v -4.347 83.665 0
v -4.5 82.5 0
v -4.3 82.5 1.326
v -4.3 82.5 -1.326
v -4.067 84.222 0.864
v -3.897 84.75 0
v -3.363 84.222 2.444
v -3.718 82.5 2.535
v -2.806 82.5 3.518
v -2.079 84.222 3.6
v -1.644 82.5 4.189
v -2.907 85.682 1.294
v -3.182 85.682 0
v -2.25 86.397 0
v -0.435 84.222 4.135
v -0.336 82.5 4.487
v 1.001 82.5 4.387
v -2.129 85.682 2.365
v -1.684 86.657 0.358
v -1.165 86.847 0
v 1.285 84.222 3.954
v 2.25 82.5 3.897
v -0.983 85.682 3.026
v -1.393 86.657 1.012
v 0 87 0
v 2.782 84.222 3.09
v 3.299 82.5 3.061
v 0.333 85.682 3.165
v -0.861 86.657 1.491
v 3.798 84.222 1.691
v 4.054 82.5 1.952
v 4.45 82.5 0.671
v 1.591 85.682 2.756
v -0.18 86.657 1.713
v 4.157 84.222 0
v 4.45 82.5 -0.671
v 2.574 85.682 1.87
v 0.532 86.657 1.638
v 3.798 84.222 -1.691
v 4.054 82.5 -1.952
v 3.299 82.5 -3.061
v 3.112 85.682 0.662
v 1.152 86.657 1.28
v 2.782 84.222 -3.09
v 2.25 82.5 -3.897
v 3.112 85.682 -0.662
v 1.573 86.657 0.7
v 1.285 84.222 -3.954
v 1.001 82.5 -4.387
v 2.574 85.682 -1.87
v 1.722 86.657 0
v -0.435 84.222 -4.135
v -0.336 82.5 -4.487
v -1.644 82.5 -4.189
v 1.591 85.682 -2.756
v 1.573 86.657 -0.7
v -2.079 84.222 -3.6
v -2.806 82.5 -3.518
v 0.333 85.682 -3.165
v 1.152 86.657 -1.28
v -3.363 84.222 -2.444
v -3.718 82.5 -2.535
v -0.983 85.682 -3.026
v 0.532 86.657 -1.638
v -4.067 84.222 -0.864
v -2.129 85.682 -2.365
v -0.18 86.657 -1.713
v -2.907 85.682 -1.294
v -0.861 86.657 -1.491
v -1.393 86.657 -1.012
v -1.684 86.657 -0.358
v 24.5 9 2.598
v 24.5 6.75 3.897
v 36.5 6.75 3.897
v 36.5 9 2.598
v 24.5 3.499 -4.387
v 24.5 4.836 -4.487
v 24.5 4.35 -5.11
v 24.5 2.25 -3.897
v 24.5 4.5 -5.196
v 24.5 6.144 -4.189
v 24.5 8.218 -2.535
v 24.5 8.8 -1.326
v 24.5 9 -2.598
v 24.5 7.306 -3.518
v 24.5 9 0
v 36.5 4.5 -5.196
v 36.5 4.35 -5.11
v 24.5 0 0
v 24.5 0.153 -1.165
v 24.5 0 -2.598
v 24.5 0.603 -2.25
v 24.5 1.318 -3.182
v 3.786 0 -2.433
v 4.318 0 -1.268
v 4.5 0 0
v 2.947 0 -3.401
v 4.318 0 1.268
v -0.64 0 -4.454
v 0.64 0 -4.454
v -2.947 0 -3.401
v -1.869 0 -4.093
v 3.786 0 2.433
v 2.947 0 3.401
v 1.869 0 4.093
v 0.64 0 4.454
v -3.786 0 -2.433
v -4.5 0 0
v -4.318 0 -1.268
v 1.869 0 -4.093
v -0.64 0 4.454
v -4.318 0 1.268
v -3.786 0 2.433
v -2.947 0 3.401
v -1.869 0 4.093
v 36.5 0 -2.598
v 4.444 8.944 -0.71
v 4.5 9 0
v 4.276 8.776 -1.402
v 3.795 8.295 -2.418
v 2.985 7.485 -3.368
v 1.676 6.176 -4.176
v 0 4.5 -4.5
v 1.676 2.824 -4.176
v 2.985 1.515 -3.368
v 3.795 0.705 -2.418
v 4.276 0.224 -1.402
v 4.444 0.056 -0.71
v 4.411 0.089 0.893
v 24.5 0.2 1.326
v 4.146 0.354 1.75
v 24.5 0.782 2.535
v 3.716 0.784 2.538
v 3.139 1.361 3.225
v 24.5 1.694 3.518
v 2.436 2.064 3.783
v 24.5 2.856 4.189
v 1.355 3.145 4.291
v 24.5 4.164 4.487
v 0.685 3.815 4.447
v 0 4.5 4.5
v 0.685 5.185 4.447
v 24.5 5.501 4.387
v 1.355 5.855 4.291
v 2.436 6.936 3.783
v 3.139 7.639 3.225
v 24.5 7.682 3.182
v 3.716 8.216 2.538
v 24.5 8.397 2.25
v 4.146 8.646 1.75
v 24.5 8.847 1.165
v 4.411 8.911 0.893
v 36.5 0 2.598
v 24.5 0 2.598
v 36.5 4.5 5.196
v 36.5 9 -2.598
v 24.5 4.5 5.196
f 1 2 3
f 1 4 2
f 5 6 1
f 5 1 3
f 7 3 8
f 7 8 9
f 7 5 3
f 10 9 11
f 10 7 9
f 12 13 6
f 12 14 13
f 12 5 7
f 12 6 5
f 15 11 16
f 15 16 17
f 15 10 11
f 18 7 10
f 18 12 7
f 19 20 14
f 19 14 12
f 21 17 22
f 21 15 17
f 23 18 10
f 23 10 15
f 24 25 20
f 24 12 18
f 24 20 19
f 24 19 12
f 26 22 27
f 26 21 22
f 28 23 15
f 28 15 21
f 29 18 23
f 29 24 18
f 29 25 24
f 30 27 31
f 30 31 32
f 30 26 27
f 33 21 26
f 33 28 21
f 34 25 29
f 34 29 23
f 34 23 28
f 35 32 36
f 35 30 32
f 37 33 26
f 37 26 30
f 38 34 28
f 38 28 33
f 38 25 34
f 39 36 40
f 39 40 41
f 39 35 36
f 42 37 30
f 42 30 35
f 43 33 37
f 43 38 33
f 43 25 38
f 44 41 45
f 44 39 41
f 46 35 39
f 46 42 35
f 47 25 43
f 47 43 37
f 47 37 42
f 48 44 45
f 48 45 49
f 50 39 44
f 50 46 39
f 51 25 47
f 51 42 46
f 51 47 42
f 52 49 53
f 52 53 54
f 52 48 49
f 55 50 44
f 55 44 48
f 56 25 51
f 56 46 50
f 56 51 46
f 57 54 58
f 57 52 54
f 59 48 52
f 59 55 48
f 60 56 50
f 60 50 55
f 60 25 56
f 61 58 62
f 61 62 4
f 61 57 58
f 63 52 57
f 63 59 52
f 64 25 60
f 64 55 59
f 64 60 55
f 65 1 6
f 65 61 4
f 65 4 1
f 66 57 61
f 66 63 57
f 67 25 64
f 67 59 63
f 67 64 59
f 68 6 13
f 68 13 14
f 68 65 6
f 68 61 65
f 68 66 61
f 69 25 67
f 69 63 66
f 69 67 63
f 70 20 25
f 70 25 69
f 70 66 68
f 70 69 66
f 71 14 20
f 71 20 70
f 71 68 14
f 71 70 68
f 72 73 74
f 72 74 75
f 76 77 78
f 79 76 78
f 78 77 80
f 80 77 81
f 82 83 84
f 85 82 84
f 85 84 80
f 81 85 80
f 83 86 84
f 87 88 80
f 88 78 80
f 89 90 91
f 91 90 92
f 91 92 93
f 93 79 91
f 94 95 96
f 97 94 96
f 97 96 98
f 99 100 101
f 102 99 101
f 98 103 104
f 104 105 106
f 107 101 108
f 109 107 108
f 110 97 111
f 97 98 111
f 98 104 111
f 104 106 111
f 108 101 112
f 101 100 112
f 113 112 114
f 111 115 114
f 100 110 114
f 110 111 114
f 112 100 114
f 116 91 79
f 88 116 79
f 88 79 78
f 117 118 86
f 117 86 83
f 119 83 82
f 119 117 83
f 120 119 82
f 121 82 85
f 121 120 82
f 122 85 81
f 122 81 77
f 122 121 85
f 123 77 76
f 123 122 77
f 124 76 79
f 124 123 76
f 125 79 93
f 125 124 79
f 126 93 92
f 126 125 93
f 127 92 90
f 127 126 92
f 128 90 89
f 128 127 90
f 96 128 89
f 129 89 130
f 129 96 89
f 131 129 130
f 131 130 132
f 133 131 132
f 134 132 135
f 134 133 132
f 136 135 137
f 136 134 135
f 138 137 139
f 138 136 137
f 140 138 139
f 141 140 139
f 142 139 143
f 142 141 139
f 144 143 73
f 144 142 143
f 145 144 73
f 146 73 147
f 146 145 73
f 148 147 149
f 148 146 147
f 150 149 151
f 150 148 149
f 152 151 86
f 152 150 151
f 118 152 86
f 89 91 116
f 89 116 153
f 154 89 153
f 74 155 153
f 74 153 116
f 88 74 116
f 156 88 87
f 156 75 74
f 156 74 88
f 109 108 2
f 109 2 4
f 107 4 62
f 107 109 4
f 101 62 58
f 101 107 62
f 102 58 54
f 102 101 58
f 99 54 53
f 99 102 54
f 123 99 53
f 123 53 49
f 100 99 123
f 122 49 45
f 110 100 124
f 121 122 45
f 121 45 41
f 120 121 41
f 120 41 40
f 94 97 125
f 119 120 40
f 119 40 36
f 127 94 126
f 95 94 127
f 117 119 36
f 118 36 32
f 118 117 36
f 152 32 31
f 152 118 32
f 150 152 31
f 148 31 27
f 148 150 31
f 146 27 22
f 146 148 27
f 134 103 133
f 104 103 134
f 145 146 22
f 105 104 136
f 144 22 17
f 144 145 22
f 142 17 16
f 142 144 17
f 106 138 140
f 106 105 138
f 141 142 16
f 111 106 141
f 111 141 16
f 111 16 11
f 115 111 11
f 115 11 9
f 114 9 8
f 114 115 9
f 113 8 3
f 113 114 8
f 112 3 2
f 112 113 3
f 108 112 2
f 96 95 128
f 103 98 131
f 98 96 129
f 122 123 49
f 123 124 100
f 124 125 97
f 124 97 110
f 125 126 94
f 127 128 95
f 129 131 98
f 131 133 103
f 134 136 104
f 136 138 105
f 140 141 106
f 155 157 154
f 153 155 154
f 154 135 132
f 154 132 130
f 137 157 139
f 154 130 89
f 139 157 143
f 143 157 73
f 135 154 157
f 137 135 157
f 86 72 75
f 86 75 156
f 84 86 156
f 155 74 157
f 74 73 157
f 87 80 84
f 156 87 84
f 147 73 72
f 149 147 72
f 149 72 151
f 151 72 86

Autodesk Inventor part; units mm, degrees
ref_plane "YZ Plane" through (0, 0, 0) normal (1, 0, 0) x (0, 1, 0)
ref_plane "XZ Plane" through (0, 0, 0) normal (0, 1, 0) x (-1, 0, 0)
ref_plane "XY Plane" through (0, 0, 0) normal (0, 0, 1) x (1, 0, 0)
sketch "Boceto1" plane through (0, 0, 0) normal (0, 1, 0) x (-1, 0, 0)
  circle A0 centre (0, 0) radius 4.5
  dimension "d0" = 9
extrude "Extrusión1" add sketch "Boceto1" along normal blind 87
fillet "Empalme1" radius 4.5 1 edges at (4.5, 87, 0)
sketch "Boceto2" plane through (0, 0, 0) normal (0, -1, 0) x (1, 0, 0)
  circle A0 centre (0, 0) radius 4.5 projected
  circle A1 centre (0, 0) radius 4.5 projected
  line L0 (3.8723, -2.2357) -> (3.8971, -2.25)
  line L1 (0, 0) -> (5.1962, 0) construction
  line L2 (4.5, -2.5981) -> (4.5, 2.5981)
  line L3 (0, 0) -> (5.1962, 0) construction
  line L4 (4.5, 2.5981) -> (0, 5.1958)
  line L5 (0, 5.1958) -> (-4.5, 2.5981)
  line L6 (-4.5, 2.5981) -> (-4.5409, -2.5978)
  line L7 (-4.5409, -2.5978) -> (-0.0409, -5.1955)
  line L8 (-0.0409, -5.1955) -> (4.5, -2.5981)
  dimension "d9" = 30
  dimension "d11" = 5.196
  dimension "d12" = 5.196
  dimension "d13" = 5.196
  dimension "d14" = 5.196
extrude "Extrusión2" [suppressed]
ref_plane "Plano de trabajo1" through (-2.2861, 0, 1.3081) normal (-0.5, 0, -0.8661) x (-0.8661, 0, 0.5)
ref_plane "Plano de trabajo2" through (4.5, 0, -2.5981) normal (0.5, 0, 0.866) x (0, 1, 0)
sketch "Boceto4" plane through (0, 0, 0) normal (1, 0, 0) x (0, 1, 0)
  circle A0 centre (4.5, 0) radius 4.5
  line L0 (0, -4.5) -> (0, 4.5) projected
  line L1 (0, 4.5) -> (82.5, 4.5) projected
  point P0 (0, 0)
  dimension "d18" = 9
  dimension "d19" = 4.5
  dimension "d20" = 4.5
extrude "Extrusión3" add sketch "Boceto4" along normal blind 24.5 contours A0
sketch "Boceto5" plane through (24.5, 4.5, 0) normal (1, 0, 0) x (0, 0, -1)
  circle A0 centre (0, 0) radius 4.5 projected
  circle A1 centre (0, 0) radius 4.5
  line L0 (0, 4.5) -> (-2.5981, 4.5)
  line L1 (-2.5981, 4.5) -> (2.5981, 4.5)
  line L2 (0, 4.5) -> (2.5981, 4.5) construction
  line L3 (0, 0) -> (5.9241, 0) construction
  line L4 (0, 0) -> (-9, 0)
  line L5 (0, 0) -> (6.2143, 0) construction
  line L6 (-3.8971, 2.25) -> (-5.1962, 0)
  line L7 (-5.1962, 0) -> (-2.5981, 4.5)
  line L8 (-5.1962, 0) -> (-2.5981, -4.5)
  line L9 (-5.1962, 0) -> (2.2031, 0) construction
  line L10 (4.5, -4.5) -> (-4.5, -4.5) projected
  line L11 (0, -4.5) -> (-2.5981, -4.5)
  line L12 (-4.5, -4.5) -> (2.5981, -4.5)
  line L13 (0, -4.5) -> (2.5981, -4.5)
  line L14 (2.5981, -4.5) -> (5.1096, -0.1499)
  line L15 (5.1096, -0.1499) -> (5.1962, 0)
  line L16 (5.1962, 0) -> (2.5981, 4.5)
  line L17 (5.1962, 0) -> (10.3923, 0) construction
  line L18 (-2.5981, -4.5) -> (-5.1962, 0)
  line L19 (-2.5981, 4.5) -> (2.5981, 4.5)
  dimension "d26" = 60
  dimension "Q" = 2.5981
  dimension "d28" = 2.5981
  dimension "d29" = 120
extrude "Extrusión4" add sketch "Boceto5" along normal blind 12
equation "\"d28\" = Q"
properties part number "antena"
